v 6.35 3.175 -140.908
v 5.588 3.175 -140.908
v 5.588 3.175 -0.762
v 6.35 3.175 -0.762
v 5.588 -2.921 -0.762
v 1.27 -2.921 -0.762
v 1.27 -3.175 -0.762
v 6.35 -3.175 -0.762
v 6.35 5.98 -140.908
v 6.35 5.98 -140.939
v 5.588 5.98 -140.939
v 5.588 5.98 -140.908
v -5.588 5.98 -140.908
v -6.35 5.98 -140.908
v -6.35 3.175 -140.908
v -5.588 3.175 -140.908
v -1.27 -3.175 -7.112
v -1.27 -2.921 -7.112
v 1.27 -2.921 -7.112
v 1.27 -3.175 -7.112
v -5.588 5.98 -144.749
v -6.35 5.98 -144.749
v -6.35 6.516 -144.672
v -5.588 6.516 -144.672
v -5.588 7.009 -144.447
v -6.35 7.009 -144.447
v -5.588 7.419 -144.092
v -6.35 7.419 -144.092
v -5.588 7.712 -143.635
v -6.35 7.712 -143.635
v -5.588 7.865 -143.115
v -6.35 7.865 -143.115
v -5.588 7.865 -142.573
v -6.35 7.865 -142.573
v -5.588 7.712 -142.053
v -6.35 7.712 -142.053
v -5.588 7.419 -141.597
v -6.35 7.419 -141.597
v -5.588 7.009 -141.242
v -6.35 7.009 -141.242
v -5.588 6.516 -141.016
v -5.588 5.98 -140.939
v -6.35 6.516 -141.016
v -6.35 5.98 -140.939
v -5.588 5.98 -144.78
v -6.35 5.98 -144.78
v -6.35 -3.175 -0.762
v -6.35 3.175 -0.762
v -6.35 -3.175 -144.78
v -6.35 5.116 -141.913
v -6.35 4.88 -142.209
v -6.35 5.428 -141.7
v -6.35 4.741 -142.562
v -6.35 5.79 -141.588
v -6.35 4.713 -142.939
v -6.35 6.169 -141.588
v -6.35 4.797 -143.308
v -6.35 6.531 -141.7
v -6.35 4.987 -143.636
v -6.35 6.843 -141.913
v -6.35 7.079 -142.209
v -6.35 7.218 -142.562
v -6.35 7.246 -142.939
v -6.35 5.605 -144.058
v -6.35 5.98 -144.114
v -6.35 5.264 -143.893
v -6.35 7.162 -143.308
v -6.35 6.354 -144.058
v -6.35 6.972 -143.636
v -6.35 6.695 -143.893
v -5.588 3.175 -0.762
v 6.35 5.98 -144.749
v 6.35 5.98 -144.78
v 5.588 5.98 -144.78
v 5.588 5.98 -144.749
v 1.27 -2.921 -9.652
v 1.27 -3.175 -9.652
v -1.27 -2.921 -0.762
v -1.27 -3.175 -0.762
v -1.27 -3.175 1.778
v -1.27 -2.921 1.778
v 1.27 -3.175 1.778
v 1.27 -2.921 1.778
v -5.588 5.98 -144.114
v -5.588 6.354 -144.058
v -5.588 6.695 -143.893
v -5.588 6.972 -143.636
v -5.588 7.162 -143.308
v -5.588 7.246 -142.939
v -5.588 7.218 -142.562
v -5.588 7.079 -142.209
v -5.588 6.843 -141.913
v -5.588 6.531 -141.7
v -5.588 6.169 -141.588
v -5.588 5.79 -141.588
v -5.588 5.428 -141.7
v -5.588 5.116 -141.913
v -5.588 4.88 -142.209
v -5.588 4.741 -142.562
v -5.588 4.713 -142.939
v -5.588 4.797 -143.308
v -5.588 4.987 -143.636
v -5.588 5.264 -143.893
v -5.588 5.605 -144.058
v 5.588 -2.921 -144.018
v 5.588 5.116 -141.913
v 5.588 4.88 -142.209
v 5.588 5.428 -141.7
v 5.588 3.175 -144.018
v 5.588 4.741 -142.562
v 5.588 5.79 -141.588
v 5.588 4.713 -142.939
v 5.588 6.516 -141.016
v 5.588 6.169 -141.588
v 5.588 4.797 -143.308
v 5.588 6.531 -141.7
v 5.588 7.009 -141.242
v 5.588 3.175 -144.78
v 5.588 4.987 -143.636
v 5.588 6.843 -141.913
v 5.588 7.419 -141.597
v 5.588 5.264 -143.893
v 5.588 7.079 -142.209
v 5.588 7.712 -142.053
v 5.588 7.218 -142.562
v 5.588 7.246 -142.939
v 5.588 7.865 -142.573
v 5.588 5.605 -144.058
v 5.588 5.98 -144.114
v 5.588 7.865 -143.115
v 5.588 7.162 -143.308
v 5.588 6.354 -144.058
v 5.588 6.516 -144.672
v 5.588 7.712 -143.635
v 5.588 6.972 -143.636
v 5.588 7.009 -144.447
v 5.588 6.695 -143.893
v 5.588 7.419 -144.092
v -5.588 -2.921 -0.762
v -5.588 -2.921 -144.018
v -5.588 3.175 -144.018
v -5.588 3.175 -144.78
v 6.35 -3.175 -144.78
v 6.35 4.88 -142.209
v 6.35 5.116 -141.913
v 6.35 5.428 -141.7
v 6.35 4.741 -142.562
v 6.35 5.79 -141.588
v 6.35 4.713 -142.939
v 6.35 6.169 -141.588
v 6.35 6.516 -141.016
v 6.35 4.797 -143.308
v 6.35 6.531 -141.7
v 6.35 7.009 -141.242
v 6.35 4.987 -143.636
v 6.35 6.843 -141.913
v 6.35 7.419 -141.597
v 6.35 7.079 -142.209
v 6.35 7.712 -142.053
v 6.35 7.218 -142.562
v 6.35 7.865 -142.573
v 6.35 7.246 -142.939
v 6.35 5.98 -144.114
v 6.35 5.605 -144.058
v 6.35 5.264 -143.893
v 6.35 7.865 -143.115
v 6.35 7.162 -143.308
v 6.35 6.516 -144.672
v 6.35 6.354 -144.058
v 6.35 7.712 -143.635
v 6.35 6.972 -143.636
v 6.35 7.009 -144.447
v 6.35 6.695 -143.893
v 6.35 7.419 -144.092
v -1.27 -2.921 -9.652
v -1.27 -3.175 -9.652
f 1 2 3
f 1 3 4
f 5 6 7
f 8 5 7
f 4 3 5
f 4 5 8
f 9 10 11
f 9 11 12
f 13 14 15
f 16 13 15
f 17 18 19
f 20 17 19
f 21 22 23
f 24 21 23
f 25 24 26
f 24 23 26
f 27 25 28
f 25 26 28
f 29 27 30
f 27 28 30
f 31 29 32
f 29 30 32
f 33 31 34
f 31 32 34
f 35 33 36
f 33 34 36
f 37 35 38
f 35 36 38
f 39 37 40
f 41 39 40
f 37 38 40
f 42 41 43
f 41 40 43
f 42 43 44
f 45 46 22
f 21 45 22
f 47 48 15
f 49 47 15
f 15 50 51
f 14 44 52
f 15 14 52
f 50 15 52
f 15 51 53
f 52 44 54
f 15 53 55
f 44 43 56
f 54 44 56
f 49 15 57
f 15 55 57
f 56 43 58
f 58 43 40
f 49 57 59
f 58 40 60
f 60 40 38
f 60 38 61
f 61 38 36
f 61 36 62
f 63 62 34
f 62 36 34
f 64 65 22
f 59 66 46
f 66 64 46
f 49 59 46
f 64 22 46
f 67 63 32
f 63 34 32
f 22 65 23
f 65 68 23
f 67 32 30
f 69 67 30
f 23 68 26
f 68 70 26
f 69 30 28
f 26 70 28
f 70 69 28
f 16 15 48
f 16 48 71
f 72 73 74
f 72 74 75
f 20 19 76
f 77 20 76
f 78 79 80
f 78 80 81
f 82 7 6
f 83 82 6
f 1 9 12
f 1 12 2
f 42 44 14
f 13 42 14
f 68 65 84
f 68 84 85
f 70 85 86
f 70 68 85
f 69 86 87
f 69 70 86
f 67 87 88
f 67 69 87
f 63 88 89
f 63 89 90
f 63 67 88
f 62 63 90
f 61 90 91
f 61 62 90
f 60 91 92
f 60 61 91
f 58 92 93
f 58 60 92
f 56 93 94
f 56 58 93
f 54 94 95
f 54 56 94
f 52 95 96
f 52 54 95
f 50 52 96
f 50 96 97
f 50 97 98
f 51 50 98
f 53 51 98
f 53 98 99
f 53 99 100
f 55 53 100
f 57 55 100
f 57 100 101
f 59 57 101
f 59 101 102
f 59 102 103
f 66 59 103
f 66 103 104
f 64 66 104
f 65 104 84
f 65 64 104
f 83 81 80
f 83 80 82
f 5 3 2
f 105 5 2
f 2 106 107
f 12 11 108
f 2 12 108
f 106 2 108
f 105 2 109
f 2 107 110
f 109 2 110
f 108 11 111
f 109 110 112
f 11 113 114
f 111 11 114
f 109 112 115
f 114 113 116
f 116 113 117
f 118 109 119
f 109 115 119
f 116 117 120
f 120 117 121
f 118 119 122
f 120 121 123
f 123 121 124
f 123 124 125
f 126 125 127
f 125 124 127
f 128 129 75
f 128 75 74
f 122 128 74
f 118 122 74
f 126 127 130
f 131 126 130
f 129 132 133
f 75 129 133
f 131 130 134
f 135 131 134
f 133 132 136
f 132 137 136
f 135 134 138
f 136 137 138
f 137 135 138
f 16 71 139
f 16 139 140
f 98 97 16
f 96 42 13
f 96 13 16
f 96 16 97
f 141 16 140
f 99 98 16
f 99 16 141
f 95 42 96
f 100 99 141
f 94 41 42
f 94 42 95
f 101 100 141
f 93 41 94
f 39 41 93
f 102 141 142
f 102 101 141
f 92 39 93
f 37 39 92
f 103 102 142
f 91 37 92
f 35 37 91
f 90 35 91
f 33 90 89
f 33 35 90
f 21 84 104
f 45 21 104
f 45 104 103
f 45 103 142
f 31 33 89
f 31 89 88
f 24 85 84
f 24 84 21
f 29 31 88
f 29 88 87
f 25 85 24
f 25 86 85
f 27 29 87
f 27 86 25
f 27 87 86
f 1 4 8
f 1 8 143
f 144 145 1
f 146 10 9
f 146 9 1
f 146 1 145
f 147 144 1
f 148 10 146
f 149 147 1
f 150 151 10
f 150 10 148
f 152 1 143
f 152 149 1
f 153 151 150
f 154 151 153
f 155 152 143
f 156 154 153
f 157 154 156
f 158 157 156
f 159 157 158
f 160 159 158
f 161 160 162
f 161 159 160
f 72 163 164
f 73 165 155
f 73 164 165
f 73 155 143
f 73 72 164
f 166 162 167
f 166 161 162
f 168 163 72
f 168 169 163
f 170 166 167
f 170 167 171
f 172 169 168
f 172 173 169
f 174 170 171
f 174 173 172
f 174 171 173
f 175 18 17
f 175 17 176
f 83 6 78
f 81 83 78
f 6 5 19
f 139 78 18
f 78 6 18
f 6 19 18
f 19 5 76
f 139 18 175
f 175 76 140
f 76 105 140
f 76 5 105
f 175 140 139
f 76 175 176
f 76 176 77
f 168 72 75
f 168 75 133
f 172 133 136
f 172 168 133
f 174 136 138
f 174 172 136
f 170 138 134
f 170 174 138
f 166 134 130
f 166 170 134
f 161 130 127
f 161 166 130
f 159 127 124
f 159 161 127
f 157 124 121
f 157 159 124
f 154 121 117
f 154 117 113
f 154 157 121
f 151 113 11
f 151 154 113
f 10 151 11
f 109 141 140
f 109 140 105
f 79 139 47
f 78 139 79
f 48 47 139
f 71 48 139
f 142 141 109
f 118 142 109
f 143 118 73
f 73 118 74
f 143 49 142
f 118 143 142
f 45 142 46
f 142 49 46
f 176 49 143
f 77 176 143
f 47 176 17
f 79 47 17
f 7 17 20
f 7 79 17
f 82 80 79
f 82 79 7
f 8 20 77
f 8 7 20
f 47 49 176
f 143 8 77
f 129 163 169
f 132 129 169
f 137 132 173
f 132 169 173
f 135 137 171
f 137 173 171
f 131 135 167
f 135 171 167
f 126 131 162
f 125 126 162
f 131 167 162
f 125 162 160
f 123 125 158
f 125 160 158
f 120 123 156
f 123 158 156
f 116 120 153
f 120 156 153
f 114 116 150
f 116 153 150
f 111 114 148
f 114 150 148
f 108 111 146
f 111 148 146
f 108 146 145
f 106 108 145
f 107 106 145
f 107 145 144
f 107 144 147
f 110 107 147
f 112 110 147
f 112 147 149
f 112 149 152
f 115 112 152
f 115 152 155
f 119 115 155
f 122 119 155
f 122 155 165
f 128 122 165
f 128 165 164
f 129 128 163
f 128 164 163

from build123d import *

# Parameters (mm, degrees)
SKETCH1_W           = 12.7
SKETCH1_H           = 6.35
BOSS_EXTRUDE1_DEPTH = 144.78
CUT_EXTRUDE1_DEPTH  = 6.096
SKETCH3_R           = 1.27
BOSS_EXTRUDE2_DEPTH = 0.762
SKETCH5_W           = 12.7
SKETCH5_H           = 6.35
CUT_EXTRUDE2_DEPTH  = 0.762
SKETCH6_W           = 2.54
SKETCH6_H           = 0.254
BOSS_EXTRUDE3_DEPTH = 2.54
SKETCH8_W           = 2.54
SKETCH8_H           = 2.54
CUT_EXTRUDE3_DEPTH  = 2.54


with BuildPart() as part:
    # Sketch1 → Boss-Extrude1 (new body)
    with BuildSketch(Plane.XY):
        Rectangle(SKETCH1_W, SKETCH1_H)
    extrude(amount=-BOSS_EXTRUDE1_DEPTH)

    # Sketch2 → Cut-Extrude1 (cut)
    with BuildSketch(Plane(origin=(0, 3.175, 0), x_dir=(1, 0, 0), z_dir=(0, 1, 0))):
        Polygon((5.588, 0.381), (-5.588, 0.381), (-5.588, 0.762), (-5.588, 144.018), (5.588, 144.018), (5.588, 0.762), align=None)
    extrude(amount=-CUT_EXTRUDE1_DEPTH, mode=Mode.SUBTRACT)

    # Sketch3 → Boss-Extrude2 (add)
    with BuildSketch(Plane(origin=(6.35, 0, 0), x_dir=(0, 0, -1), z_dir=(1, 0, 0))):
        with BuildLine():
            Line((144.78, 3.175), (144.78, 5.979528965))
            Line((144.78, 5.979528965), (144.749123731, 5.979528965))
            ThreePointArc((144.749123731, 5.979528965), (142.844123731, 7.884528965), (140.939123731, 5.979528965))
            Line((140.939123731, 5.979528965), (140.908247462, 5.979528965))
            Line((140.908247462, 5.979528965), (140.908247462, 3.175))
            Line((140.908247462, 3.175), (144.78, 3.175))
        make_face()
        with Locations((142.844123731, 5.979528965)):
            Circle(SKETCH3_R, mode=Mode.SUBTRACT)
    boss_extrude2 = extrude(amount=-BOSS_EXTRUDE2_DEPTH)

    # Mirror1: Boss-Extrude2 across plane
    add(boss_extrude2.mirror(Plane(origin=(0, 0, 0), x_dir=(0, 0, 1), z_dir=(1, 0, 0))))

    # Sketch5 → Cut-Extrude2 (cut)
    with BuildSketch(Plane.XY):
        Rectangle(SKETCH5_W, SKETCH5_H)
    extrude(amount=-CUT_EXTRUDE2_DEPTH, mode=Mode.SUBTRACT)

    # Sketch6 → Boss-Extrude3 (add)
    with BuildSketch(Plane.XY.offset(-0.762)):
        with Locations((0, -3.048)):
            Rectangle(SKETCH6_W, SKETCH6_H)
    extrude(amount=BOSS_EXTRUDE3_DEPTH)

    # Sketch8 → Cut-Extrude3 (cut)
    with BuildSketch(Plane(origin=(0, -2.921, 0), x_dir=(1, 0, 0), z_dir=(0, 1, 0))):
        with Locations((0, 8.382)):
            Rectangle(SKETCH8_W, SKETCH8_H)
    extrude(amount=-CUT_EXTRUDE3_DEPTH, mode=Mode.SUBTRACT)


solid = part.part
